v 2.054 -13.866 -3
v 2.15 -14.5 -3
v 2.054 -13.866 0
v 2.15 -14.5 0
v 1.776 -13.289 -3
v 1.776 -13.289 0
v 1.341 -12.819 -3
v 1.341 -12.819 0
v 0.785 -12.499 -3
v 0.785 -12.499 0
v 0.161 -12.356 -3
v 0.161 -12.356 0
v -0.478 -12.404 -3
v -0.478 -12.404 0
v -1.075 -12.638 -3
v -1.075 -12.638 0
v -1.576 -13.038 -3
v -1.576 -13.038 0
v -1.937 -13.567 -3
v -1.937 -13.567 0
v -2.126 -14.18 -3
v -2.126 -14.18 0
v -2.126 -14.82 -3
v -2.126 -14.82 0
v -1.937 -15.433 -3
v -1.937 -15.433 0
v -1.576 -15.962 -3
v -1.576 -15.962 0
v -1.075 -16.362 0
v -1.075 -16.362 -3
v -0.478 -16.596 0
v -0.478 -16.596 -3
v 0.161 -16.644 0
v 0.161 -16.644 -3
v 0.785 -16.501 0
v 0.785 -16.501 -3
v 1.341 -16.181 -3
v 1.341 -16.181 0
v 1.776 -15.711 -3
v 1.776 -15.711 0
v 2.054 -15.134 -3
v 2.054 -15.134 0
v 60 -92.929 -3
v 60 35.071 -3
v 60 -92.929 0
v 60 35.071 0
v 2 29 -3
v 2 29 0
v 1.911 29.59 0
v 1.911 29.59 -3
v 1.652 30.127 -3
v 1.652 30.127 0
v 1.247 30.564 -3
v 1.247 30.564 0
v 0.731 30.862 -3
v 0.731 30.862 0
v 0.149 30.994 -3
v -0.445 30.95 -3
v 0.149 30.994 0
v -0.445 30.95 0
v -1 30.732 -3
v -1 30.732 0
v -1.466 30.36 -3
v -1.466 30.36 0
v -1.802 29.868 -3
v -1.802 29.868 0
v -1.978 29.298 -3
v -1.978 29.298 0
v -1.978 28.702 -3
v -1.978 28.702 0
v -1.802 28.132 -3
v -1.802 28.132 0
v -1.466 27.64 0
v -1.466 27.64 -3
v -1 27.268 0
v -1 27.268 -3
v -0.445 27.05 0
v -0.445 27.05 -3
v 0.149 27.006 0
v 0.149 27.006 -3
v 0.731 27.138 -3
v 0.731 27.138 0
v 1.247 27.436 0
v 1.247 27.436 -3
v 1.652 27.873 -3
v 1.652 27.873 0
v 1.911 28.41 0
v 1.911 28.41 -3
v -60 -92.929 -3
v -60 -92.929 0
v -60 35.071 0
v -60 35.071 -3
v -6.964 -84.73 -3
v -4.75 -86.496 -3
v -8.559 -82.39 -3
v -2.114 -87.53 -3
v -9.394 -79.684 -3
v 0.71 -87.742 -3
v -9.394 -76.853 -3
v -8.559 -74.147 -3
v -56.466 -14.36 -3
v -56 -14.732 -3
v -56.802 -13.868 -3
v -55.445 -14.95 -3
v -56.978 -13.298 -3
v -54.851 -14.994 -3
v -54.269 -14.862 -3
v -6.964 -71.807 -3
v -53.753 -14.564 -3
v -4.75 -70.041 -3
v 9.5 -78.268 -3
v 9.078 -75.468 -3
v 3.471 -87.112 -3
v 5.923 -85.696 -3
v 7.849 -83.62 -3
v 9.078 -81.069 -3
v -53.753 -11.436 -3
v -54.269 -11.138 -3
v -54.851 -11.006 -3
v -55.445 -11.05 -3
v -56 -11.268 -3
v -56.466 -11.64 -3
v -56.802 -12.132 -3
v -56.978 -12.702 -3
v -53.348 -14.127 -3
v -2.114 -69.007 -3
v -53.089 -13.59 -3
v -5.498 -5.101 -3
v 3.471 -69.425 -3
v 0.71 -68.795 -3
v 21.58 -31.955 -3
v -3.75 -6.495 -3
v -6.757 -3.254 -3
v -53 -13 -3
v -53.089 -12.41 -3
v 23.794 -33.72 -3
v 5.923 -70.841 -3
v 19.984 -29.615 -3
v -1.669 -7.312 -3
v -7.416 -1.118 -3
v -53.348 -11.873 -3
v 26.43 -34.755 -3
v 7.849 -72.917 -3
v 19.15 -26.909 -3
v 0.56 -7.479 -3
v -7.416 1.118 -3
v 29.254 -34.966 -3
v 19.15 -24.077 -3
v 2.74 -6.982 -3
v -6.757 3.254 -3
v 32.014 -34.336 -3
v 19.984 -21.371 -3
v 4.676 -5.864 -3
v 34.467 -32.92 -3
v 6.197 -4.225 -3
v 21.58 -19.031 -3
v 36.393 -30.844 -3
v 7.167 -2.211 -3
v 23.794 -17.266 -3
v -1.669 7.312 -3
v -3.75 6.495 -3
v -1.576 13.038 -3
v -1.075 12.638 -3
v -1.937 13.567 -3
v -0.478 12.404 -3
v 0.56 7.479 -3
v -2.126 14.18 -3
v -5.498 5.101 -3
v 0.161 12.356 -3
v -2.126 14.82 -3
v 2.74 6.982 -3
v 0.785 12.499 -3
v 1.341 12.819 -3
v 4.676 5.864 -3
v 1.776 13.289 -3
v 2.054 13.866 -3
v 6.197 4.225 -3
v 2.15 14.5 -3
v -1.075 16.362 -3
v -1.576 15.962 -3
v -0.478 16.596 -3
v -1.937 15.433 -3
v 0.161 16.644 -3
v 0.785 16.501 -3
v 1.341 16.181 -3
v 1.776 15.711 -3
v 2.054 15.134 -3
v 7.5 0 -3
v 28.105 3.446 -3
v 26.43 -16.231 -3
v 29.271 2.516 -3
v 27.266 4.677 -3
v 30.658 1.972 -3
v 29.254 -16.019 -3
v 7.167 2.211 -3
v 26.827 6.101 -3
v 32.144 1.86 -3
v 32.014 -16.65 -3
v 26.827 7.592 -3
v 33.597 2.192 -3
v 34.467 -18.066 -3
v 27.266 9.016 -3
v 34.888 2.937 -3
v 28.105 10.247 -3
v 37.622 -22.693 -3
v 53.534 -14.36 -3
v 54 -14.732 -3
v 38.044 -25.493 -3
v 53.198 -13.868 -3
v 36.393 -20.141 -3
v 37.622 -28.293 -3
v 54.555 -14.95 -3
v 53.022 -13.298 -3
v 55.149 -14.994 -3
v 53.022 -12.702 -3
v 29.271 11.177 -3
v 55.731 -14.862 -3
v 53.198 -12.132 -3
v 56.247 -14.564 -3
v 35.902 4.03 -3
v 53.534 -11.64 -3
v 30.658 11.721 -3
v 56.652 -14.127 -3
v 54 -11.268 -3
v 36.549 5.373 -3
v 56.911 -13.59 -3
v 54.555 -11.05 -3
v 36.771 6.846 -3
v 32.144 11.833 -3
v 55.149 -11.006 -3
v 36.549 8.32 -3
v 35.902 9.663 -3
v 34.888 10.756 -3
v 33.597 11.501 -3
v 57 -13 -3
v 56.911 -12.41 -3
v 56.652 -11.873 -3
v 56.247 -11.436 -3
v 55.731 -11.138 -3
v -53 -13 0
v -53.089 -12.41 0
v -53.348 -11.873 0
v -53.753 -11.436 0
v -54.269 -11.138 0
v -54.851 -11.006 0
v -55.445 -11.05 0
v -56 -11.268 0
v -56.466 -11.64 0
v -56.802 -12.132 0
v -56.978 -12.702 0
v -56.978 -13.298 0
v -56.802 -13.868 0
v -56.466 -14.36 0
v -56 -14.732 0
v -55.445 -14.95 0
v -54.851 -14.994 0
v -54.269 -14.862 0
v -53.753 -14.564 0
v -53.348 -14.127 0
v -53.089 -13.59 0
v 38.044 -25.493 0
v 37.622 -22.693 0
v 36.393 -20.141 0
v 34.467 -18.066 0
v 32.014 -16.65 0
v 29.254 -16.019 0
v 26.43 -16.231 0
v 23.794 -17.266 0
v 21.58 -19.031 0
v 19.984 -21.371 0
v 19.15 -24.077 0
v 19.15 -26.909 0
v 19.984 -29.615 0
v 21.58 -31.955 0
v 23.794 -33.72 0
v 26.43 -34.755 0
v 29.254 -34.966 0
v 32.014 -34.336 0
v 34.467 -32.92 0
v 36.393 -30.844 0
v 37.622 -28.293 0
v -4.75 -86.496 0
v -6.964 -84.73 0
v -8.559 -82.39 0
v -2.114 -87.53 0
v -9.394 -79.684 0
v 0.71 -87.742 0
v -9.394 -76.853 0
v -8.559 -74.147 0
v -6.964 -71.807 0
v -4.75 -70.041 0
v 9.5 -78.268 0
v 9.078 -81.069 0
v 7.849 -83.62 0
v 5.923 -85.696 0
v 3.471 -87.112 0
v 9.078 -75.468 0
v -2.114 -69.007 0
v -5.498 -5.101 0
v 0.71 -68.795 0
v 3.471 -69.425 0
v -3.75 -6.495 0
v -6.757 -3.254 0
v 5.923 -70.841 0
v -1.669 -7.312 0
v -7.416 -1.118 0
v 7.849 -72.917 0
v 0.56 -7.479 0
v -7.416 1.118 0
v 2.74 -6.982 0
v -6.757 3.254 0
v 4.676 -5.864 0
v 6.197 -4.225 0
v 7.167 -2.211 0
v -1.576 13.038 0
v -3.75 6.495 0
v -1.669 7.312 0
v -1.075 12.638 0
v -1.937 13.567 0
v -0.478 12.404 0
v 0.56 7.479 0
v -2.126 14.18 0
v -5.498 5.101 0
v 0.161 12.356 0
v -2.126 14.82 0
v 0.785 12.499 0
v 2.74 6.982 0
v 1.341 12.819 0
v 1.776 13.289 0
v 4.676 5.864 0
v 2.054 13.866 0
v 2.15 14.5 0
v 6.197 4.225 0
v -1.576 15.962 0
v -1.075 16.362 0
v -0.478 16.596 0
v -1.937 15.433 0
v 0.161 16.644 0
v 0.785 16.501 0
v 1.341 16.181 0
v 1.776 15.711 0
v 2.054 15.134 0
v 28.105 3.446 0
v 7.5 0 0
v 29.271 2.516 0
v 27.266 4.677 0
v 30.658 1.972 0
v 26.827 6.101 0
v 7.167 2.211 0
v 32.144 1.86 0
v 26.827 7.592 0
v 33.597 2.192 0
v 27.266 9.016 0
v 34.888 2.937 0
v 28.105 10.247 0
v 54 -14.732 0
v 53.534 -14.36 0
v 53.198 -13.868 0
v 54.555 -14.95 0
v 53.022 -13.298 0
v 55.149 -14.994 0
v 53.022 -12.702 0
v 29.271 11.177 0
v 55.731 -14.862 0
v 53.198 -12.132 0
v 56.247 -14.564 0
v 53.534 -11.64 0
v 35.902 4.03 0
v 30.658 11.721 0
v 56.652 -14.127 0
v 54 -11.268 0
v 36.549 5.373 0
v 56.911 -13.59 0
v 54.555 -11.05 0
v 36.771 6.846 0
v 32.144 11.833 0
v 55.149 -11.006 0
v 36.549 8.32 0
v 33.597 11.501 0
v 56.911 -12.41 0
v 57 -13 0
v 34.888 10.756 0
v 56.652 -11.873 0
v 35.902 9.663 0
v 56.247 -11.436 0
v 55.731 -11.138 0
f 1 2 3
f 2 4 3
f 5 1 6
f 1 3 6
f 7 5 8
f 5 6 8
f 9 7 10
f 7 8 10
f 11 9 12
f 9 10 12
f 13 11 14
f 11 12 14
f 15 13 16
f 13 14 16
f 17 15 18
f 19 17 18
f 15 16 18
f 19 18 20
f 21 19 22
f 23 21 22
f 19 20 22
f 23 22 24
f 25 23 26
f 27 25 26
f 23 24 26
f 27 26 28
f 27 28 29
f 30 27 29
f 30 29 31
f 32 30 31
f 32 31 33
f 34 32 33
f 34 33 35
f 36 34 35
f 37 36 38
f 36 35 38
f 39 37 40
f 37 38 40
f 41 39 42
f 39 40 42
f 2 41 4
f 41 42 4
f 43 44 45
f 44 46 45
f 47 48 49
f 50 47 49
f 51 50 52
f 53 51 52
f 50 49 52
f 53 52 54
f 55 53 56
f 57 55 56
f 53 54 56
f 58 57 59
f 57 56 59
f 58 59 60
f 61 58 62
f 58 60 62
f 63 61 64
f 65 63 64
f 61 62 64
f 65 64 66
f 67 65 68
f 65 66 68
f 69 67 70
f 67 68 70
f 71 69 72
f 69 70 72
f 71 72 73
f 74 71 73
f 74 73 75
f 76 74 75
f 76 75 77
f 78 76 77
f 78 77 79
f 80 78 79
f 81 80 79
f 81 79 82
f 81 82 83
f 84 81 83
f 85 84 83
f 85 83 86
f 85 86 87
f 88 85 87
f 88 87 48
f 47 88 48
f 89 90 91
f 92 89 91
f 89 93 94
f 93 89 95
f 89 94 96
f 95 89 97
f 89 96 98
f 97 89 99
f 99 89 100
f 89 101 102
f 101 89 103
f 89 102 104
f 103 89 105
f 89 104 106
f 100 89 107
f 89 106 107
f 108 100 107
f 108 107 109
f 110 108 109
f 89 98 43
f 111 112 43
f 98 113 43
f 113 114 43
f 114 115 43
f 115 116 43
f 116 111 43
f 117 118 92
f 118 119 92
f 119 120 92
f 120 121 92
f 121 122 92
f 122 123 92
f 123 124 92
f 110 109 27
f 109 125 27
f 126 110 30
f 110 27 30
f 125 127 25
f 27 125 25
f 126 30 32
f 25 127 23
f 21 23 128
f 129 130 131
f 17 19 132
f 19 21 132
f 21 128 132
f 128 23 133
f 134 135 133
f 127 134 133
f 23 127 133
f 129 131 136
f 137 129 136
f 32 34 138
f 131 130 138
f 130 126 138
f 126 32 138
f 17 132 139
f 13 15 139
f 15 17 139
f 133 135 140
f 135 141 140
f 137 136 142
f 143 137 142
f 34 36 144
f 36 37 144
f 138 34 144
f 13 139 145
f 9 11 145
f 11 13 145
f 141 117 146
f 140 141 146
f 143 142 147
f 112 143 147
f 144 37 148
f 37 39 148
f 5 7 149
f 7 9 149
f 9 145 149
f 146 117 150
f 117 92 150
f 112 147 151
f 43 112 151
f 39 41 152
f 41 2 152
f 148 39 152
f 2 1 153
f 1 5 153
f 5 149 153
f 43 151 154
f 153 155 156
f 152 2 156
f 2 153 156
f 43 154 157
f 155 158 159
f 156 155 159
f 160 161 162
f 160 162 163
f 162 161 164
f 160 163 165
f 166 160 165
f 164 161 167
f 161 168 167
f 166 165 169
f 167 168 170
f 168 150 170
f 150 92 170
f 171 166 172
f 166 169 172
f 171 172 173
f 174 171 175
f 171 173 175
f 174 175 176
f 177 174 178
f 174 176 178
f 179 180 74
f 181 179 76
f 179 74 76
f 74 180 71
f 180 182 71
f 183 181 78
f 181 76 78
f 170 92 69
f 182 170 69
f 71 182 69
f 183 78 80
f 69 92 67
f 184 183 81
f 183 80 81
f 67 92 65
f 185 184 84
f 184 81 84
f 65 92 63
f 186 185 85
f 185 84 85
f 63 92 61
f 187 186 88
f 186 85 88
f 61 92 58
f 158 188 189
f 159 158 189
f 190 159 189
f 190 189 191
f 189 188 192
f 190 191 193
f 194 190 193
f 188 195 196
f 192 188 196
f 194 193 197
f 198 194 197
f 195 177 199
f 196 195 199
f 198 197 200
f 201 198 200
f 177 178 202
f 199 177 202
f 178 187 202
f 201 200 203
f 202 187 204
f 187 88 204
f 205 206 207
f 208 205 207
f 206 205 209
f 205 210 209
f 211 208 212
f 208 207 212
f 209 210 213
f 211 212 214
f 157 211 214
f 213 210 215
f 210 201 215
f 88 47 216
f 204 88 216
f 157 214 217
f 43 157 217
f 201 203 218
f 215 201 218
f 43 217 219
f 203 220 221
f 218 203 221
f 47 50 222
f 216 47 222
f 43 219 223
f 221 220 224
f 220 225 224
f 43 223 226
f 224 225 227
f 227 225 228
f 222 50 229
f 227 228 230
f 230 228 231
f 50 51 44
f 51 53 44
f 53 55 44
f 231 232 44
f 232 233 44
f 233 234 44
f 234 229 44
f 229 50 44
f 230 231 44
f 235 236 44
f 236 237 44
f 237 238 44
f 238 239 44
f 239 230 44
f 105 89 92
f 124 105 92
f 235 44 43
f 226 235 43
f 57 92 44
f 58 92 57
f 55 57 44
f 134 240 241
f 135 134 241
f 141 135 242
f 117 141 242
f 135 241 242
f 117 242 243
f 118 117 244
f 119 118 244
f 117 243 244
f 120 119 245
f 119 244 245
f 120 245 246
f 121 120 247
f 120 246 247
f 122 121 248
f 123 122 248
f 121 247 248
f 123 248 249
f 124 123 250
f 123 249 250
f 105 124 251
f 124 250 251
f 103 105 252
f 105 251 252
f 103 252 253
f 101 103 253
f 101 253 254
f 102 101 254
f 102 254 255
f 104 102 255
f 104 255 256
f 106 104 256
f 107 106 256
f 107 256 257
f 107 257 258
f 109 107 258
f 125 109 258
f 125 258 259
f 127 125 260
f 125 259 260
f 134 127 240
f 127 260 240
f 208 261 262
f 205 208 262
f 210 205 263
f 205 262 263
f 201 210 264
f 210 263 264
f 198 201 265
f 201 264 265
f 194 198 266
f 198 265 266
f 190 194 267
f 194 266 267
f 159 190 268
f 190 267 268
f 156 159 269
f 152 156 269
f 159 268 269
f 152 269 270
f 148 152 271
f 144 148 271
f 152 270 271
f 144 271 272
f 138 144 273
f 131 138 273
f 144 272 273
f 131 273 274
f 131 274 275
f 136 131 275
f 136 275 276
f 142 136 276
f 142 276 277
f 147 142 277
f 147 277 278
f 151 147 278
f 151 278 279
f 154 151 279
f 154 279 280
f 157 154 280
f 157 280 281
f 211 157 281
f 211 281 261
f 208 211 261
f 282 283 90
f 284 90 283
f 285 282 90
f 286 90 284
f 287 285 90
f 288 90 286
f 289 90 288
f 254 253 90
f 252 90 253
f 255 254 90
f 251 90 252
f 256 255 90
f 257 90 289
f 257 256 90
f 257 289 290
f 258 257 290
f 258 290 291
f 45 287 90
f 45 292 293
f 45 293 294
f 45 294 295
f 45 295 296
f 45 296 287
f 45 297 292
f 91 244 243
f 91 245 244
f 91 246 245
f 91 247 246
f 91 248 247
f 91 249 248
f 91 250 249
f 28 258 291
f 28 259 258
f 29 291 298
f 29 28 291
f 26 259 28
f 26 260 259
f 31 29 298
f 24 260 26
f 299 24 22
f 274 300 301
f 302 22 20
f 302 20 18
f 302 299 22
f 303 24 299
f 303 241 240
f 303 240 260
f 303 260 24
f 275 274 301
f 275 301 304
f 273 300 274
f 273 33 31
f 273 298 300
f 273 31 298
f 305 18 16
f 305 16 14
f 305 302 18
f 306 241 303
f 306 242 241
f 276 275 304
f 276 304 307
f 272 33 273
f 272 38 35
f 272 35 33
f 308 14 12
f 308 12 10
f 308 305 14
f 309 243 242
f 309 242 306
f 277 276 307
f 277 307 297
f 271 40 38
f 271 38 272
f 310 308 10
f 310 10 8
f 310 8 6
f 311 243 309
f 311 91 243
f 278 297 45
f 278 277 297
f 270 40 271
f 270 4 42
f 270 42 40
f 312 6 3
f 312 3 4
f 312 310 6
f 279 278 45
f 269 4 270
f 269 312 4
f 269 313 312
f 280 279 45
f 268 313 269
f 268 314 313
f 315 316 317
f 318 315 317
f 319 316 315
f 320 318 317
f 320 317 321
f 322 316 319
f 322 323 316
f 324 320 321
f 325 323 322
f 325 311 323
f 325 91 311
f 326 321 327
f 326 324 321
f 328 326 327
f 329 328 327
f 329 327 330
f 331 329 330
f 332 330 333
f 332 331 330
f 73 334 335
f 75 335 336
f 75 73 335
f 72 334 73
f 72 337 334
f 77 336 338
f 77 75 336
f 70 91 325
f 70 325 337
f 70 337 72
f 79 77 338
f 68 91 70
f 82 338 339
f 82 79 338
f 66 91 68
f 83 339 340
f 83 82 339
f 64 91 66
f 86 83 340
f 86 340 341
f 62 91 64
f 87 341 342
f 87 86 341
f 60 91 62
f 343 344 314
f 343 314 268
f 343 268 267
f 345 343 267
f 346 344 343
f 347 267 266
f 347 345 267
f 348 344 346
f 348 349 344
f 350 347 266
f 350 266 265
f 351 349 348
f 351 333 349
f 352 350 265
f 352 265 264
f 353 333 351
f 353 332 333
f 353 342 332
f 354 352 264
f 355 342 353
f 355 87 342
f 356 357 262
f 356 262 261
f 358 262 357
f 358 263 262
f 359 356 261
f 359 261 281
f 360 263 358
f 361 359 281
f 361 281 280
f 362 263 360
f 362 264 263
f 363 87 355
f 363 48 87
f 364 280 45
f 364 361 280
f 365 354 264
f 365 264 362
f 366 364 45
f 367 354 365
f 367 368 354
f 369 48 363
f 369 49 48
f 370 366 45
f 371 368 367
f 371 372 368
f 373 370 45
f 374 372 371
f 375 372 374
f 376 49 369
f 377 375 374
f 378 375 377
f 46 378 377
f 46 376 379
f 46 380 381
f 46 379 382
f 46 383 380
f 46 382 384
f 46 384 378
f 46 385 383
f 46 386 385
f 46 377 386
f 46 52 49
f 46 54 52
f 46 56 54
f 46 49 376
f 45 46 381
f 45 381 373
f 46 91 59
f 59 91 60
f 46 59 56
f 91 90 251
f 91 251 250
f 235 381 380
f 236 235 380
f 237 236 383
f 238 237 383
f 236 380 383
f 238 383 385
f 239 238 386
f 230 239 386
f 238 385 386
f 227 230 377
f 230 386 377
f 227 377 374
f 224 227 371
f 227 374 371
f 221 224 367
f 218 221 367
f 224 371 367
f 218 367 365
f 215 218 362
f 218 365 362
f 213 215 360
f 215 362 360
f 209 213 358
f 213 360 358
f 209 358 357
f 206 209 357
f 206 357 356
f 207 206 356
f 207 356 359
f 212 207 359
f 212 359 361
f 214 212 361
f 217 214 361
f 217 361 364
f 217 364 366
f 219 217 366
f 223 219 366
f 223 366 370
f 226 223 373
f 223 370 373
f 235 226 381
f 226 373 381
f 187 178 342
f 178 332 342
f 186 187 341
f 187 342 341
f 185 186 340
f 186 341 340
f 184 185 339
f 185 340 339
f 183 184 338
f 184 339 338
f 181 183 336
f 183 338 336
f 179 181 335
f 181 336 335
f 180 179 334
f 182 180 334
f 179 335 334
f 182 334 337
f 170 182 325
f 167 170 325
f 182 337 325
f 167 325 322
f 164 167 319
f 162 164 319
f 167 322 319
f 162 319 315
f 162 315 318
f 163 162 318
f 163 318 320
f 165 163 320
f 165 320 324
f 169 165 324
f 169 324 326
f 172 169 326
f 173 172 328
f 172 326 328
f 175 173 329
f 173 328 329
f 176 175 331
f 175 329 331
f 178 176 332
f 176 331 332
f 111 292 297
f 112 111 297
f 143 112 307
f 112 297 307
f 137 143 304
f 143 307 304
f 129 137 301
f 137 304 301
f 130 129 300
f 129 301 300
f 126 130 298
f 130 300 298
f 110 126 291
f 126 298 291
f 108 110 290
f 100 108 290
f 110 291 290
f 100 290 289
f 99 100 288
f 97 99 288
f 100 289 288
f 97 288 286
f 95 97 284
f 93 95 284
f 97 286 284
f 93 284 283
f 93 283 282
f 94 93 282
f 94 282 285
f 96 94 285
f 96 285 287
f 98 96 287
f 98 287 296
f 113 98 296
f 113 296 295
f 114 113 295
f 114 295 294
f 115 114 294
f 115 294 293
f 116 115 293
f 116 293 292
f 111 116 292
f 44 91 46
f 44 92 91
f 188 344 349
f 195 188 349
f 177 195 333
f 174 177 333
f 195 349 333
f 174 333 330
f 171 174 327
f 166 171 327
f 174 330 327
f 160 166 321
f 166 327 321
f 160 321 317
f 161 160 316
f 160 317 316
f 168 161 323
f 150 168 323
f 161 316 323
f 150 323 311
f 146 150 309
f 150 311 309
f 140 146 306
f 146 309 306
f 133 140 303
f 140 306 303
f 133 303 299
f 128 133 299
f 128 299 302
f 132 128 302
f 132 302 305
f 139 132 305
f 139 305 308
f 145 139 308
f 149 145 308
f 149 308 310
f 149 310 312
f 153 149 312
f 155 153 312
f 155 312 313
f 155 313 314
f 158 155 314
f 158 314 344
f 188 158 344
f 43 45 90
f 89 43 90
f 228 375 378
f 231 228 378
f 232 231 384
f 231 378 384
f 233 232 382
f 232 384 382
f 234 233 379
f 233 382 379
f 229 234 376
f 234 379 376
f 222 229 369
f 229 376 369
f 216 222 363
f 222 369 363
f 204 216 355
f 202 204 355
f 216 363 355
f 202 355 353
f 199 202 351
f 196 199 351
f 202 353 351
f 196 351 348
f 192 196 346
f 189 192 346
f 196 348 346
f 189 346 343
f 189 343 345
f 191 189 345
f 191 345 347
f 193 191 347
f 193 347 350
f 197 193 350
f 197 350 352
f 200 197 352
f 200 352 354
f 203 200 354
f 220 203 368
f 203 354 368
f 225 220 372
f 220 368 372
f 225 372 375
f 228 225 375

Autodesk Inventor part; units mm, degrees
ref_plane "YZ Plane" through (0, 0, 0) normal (1, 0, 0) x (0, 1, 0)
ref_plane "XZ Plane" through (0, 0, 0) normal (0, 1, 0) x (-1, 0, 0)
ref_plane "XY Plane" through (0, 0, 0) normal (0, 0, 1) x (1, 0, 0)
sketch "スケッチ3" plane through (0, 0, 0) normal (0, 0, 1) x (1, 0, 0)
  line L0 (60, -99.3436) -> (-60, -99.3436)
  line L1 (-60, -99.3436) -> (-60, 99.3436)
  line L2 (-60, 99.3436) -> (60, 99.3436)
  line L3 (60, 99.3436) -> (60, -99.3436)
  line L4 (60, -99.3436) -> (-60, 99.3436) construction
  line L5 (-60, -99.3436) -> (60, 99.3436) construction
  point P0 (0, 0)
  dimension "d25" = 120
extrude "押し出し1" add sketch "スケッチ3" against normal blind 3
sketch "スケッチ4" plane through (0, 0, 0) normal (0, 0, 1) x (1, 0, 0)
  line L0 (0, 45.0711) -> (68.3595, 45.0711)
  line L1 (68.3595, 45.0711) -> (-74.3824, 45.0711)
  line L2 (-74.3824, 45.0711) -> (108.1656, 45.0711)
  line L3 (108.1656, 45.0711) -> (108.1656, 129.4154)
  line L4 (108.1656, 129.4154) -> (-74.3824, 129.4154)
  line L5 (-74.3824, 129.4154) -> (-74.3824, 45.0711)
  point P0 (0, 0)
extrude "押し出し4" cut sketch "スケッチ4" against normal blind 10
sketch "スケッチ12" plane through (0, 0, 0) normal (0, 0, 1) x (1, 0, 0)
  circle A0 centre (0, 0) radius 7.5
  circle A1 centre (0, 0) radius 22.5
  dimension "d85" = 15
  dimension "d93" = 45
sketch "スケッチ13" plane through (0, 0, 0) normal (0, 0, 1) x (1, 0, 0)
  circle A0 centre (0, 0) radius 7.5
  circle A1 centre (0, 0) radius 32.5
  circle A2 centre (31.7707, 6.8465) radius 25
  circle A3 centre (31.7707, 6.8465) radius 7.5
  circle A4 centre (31.7707, 6.8465) radius 32.5
  circle A5 centre (28.5436, -25.4929) radius 25
  circle A6 centre (28.5436, -25.4929) radius 20
  circle A7 centre (28.5436, -25.4929) radius 60
  circle A8 centre (0, -78.2685) radius 40
  circle A9 centre (0, -78.2685) radius 50
  circle A10 centre (31.7707, 6.8465) radius 5
  circle A11 centre (28.5436, -25.4929) radius 9.5
  circle A12 centre (0, -78.2685) radius 9.5
  dimension "d87" = 65
  dimension "d89" = 65
  dimension "d91" = 120
  dimension "d86" = 15
  dimension "d88" = 15
  dimension "d90" = 40
  dimension "d92" = 100
  dimension "d96" = 10
  dimension "d97" = 19
  dimension "d98" = 19
extrude "押し出し15" cut sketch "スケッチ12" against normal blind 10 contours A0
extrude "押し出し16" cut sketch "スケッチ13" against normal blind 10 contours A10 A1 | A1 A10 | A11 A1 A2 | A2 A1 A4 A11 | A4 A1 A11 | A2 A11 A4 A1 | A1 A11 A2 | A4 A11 A1 | A12 A7 | A7 A12
sketch "スケッチ14" plane through (0, 0, 0) normal (0, 0, 1) x (1, 0, 0)
  line L0 (-60, -99.3436) -> (-60, 45.0711) projected
  line L1 (60, 45.0711) -> (60, -99.3436) projected
  line L2 (-60, 45.0711) -> (60, 45.0711)
  line L3 (60, 45.0711) -> (60, -92.9289)
  line L4 (60, -92.9289) -> (-60, -92.9289)
  line L5 (-60, -92.9289) -> (-60, 45.0711)
  point P0 (0, 0)
  dimension "d101" = 138
extrude "押し出し17" cut sketch "スケッチ14" against normal blind 10 keep common part
sketch "スケッチ15" plane through (-60, 45.0711, 0) normal (0, 1, 0) x (1, 0, 0)
  line L0 (-15.5399, 21.7204) -> (138.9638, 21.7204)
  line L1 (138.9638, 21.7204) -> (138.9638, -41.1938)
  line L2 (138.9638, -41.1938) -> (-15.5399, -41.1938)
  line L3 (-15.5399, -41.1938) -> (-15.5399, 21.7204)
  point P0 (60, 0)
extrude "押し出し18" cut sketch "スケッチ15" against normal blind 10
sketch "スケッチ16" plane through (0, 0, 0) normal (0, 0, 1) x (1, 0, 0)
  circle A0 centre (31.7707, 6.8465) radius 5 projected
  circle A1 centre (31.7707, 6.8465) radius 25
  circle A2 centre (28.5436, -25.4929) radius 9.5 projected
  circle A3 centre (28.5436, -25.4929) radius 25
  circle A4 centre (55, -13) radius 2
  circle A5 centre (-55, -13) radius 2
  circle A6 centre (0, 29) radius 2
  point P0 (0, 0)
  dimension "d109" = 50
  dimension "d110" = 50
  dimension "d111" = 4
  dimension "d112" = 4
  dimension "d113" = 4
extrude "押し出し19" cut sketch "スケッチ16" against normal blind 10 contours A4 | A5 | A6
sketch "スケッチ17" plane through (0, 0, 0) normal (0, 0, 1) x (1, 0, 0)
  line L0 (0, 0) -> (0, 14.5)
  line L1 (0, 14.5) -> (0, -14.5)
  circle A0 centre (0, 14.5) radius 2.15
  circle A1 centre (0, -14.5) radius 2.15
  dimension "d116" = 14.5
  dimension "d117" = 29
  dimension "d118" = 4.3
  dimension "d119" = 4.3
extrude "押し出し20" cut sketch "スケッチ17" against normal blind 10
properties part number "板2" material "アルミニウム 6061"
